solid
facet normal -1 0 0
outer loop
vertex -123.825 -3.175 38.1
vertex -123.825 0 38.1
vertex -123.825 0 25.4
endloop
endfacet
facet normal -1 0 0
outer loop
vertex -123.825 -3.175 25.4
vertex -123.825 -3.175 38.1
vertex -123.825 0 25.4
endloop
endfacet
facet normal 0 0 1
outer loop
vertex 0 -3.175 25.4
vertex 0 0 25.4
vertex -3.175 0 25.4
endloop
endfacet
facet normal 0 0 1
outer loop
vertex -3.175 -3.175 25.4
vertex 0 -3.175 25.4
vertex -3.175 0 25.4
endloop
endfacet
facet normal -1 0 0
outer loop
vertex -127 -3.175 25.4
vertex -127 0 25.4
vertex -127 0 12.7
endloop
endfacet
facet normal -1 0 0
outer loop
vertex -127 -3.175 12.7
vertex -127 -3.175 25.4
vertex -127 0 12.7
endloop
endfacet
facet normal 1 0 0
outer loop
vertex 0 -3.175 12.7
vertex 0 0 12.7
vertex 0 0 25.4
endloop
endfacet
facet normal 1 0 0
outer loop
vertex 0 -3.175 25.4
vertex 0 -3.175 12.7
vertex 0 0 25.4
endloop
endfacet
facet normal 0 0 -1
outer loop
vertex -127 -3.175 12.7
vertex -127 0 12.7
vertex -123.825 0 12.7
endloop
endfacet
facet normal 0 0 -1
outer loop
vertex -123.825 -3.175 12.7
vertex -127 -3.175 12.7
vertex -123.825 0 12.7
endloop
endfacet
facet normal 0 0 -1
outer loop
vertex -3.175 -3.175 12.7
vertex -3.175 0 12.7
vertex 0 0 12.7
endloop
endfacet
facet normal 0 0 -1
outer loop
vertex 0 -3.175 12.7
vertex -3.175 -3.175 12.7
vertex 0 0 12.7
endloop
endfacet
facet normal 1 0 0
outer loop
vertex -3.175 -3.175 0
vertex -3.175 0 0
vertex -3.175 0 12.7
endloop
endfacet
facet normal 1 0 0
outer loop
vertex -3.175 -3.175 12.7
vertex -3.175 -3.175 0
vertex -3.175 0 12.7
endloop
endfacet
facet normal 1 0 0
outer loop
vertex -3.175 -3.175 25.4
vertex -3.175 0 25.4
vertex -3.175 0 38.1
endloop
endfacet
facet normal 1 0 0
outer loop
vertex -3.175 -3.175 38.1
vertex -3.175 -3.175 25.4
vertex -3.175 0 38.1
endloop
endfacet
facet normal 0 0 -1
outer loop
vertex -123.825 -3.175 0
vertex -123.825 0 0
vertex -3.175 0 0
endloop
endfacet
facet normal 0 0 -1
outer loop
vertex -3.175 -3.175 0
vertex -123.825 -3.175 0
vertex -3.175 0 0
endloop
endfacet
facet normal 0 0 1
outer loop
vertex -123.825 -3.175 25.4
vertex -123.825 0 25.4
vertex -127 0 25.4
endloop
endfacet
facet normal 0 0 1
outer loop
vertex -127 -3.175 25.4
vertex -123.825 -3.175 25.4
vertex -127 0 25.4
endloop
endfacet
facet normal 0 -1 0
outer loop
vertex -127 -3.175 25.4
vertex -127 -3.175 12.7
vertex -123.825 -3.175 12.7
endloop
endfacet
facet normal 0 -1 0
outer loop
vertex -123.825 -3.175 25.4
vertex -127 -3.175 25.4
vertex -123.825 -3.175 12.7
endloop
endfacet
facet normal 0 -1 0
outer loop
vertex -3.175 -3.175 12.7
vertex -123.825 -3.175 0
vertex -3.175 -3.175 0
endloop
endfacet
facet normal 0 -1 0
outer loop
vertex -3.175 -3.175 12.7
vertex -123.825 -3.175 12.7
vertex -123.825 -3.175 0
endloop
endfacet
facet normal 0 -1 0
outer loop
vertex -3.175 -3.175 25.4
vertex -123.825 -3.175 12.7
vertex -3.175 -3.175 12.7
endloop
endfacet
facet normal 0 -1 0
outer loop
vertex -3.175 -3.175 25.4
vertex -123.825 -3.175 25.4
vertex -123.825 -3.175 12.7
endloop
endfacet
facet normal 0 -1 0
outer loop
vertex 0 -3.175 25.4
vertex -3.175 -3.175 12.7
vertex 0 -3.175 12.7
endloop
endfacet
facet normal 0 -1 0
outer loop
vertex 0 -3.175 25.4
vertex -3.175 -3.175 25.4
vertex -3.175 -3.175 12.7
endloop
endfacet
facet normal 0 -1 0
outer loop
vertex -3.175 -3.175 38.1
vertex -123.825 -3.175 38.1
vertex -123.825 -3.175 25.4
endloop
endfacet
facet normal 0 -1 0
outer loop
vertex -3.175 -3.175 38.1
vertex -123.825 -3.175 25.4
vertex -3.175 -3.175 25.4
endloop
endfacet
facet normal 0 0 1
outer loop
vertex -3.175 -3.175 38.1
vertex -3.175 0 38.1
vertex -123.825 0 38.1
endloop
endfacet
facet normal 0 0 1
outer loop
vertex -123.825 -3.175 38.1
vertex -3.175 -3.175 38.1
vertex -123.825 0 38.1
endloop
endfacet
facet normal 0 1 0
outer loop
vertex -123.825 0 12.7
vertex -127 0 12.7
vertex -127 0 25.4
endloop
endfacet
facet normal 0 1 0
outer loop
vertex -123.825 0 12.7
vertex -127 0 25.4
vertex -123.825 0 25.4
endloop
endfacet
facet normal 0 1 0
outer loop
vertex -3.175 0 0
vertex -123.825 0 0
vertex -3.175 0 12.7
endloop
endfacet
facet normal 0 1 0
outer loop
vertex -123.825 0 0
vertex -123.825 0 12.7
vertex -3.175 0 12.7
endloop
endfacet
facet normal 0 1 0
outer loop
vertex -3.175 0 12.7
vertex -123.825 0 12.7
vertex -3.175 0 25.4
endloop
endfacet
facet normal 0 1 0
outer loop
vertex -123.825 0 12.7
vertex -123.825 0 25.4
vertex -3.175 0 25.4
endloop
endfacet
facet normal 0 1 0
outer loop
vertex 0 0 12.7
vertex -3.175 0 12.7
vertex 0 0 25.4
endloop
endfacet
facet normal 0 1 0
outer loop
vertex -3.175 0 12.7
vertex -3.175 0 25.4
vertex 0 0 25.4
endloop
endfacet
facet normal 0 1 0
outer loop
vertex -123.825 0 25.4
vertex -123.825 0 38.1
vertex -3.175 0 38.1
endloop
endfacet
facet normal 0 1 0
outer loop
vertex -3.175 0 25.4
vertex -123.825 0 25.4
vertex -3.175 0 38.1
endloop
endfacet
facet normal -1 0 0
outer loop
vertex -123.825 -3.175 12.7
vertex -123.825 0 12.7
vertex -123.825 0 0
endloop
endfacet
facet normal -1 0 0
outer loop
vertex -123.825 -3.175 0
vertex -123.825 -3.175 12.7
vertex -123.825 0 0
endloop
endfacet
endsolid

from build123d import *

# Parameters (mm, degrees)
F1_DEPTH = 3.175
F0_W     = 3.175
F0_H     = 12.7
F2_DEPTH = 25.4


with BuildPart() as f1:
    # F0 (on Front) → F1 (new body)
    with BuildSketch(Plane.XZ):
        Polygon((-123.825, 0), (-63.5, 0), (-63.5, 38.1), (-123.825, 38.1), (-123.825, 25.4), (-127, 25.4), (-127, 12.7), (-123.825, 12.7), align=None)
        Polygon((-63.5, 0), (-3.175, 0), (-3.175, 12.7), (0, 12.7), (0, 25.4), (-3.175, 25.4), (-3.175, 38.1), (-63.5, 38.1), align=None)
    extrude(amount=F1_DEPTH)

    # F0 (on Front) → F2 (cut)
    with BuildSketch(Plane.XZ):
        with Locations((-125.4125, 6.35)):
            Rectangle(F0_W, F0_H)
        with Locations((-125.4125, 31.75)):
            Rectangle(F0_W, F0_H)
        with Locations((-1.5875, 31.75)):
            Rectangle(F0_W, F0_H)
        with Locations((-1.5875, 6.35)):
            Rectangle(F0_W, F0_H)
    extrude(amount=-F2_DEPTH, mode=Mode.SUBTRACT)


solid = f1.part
